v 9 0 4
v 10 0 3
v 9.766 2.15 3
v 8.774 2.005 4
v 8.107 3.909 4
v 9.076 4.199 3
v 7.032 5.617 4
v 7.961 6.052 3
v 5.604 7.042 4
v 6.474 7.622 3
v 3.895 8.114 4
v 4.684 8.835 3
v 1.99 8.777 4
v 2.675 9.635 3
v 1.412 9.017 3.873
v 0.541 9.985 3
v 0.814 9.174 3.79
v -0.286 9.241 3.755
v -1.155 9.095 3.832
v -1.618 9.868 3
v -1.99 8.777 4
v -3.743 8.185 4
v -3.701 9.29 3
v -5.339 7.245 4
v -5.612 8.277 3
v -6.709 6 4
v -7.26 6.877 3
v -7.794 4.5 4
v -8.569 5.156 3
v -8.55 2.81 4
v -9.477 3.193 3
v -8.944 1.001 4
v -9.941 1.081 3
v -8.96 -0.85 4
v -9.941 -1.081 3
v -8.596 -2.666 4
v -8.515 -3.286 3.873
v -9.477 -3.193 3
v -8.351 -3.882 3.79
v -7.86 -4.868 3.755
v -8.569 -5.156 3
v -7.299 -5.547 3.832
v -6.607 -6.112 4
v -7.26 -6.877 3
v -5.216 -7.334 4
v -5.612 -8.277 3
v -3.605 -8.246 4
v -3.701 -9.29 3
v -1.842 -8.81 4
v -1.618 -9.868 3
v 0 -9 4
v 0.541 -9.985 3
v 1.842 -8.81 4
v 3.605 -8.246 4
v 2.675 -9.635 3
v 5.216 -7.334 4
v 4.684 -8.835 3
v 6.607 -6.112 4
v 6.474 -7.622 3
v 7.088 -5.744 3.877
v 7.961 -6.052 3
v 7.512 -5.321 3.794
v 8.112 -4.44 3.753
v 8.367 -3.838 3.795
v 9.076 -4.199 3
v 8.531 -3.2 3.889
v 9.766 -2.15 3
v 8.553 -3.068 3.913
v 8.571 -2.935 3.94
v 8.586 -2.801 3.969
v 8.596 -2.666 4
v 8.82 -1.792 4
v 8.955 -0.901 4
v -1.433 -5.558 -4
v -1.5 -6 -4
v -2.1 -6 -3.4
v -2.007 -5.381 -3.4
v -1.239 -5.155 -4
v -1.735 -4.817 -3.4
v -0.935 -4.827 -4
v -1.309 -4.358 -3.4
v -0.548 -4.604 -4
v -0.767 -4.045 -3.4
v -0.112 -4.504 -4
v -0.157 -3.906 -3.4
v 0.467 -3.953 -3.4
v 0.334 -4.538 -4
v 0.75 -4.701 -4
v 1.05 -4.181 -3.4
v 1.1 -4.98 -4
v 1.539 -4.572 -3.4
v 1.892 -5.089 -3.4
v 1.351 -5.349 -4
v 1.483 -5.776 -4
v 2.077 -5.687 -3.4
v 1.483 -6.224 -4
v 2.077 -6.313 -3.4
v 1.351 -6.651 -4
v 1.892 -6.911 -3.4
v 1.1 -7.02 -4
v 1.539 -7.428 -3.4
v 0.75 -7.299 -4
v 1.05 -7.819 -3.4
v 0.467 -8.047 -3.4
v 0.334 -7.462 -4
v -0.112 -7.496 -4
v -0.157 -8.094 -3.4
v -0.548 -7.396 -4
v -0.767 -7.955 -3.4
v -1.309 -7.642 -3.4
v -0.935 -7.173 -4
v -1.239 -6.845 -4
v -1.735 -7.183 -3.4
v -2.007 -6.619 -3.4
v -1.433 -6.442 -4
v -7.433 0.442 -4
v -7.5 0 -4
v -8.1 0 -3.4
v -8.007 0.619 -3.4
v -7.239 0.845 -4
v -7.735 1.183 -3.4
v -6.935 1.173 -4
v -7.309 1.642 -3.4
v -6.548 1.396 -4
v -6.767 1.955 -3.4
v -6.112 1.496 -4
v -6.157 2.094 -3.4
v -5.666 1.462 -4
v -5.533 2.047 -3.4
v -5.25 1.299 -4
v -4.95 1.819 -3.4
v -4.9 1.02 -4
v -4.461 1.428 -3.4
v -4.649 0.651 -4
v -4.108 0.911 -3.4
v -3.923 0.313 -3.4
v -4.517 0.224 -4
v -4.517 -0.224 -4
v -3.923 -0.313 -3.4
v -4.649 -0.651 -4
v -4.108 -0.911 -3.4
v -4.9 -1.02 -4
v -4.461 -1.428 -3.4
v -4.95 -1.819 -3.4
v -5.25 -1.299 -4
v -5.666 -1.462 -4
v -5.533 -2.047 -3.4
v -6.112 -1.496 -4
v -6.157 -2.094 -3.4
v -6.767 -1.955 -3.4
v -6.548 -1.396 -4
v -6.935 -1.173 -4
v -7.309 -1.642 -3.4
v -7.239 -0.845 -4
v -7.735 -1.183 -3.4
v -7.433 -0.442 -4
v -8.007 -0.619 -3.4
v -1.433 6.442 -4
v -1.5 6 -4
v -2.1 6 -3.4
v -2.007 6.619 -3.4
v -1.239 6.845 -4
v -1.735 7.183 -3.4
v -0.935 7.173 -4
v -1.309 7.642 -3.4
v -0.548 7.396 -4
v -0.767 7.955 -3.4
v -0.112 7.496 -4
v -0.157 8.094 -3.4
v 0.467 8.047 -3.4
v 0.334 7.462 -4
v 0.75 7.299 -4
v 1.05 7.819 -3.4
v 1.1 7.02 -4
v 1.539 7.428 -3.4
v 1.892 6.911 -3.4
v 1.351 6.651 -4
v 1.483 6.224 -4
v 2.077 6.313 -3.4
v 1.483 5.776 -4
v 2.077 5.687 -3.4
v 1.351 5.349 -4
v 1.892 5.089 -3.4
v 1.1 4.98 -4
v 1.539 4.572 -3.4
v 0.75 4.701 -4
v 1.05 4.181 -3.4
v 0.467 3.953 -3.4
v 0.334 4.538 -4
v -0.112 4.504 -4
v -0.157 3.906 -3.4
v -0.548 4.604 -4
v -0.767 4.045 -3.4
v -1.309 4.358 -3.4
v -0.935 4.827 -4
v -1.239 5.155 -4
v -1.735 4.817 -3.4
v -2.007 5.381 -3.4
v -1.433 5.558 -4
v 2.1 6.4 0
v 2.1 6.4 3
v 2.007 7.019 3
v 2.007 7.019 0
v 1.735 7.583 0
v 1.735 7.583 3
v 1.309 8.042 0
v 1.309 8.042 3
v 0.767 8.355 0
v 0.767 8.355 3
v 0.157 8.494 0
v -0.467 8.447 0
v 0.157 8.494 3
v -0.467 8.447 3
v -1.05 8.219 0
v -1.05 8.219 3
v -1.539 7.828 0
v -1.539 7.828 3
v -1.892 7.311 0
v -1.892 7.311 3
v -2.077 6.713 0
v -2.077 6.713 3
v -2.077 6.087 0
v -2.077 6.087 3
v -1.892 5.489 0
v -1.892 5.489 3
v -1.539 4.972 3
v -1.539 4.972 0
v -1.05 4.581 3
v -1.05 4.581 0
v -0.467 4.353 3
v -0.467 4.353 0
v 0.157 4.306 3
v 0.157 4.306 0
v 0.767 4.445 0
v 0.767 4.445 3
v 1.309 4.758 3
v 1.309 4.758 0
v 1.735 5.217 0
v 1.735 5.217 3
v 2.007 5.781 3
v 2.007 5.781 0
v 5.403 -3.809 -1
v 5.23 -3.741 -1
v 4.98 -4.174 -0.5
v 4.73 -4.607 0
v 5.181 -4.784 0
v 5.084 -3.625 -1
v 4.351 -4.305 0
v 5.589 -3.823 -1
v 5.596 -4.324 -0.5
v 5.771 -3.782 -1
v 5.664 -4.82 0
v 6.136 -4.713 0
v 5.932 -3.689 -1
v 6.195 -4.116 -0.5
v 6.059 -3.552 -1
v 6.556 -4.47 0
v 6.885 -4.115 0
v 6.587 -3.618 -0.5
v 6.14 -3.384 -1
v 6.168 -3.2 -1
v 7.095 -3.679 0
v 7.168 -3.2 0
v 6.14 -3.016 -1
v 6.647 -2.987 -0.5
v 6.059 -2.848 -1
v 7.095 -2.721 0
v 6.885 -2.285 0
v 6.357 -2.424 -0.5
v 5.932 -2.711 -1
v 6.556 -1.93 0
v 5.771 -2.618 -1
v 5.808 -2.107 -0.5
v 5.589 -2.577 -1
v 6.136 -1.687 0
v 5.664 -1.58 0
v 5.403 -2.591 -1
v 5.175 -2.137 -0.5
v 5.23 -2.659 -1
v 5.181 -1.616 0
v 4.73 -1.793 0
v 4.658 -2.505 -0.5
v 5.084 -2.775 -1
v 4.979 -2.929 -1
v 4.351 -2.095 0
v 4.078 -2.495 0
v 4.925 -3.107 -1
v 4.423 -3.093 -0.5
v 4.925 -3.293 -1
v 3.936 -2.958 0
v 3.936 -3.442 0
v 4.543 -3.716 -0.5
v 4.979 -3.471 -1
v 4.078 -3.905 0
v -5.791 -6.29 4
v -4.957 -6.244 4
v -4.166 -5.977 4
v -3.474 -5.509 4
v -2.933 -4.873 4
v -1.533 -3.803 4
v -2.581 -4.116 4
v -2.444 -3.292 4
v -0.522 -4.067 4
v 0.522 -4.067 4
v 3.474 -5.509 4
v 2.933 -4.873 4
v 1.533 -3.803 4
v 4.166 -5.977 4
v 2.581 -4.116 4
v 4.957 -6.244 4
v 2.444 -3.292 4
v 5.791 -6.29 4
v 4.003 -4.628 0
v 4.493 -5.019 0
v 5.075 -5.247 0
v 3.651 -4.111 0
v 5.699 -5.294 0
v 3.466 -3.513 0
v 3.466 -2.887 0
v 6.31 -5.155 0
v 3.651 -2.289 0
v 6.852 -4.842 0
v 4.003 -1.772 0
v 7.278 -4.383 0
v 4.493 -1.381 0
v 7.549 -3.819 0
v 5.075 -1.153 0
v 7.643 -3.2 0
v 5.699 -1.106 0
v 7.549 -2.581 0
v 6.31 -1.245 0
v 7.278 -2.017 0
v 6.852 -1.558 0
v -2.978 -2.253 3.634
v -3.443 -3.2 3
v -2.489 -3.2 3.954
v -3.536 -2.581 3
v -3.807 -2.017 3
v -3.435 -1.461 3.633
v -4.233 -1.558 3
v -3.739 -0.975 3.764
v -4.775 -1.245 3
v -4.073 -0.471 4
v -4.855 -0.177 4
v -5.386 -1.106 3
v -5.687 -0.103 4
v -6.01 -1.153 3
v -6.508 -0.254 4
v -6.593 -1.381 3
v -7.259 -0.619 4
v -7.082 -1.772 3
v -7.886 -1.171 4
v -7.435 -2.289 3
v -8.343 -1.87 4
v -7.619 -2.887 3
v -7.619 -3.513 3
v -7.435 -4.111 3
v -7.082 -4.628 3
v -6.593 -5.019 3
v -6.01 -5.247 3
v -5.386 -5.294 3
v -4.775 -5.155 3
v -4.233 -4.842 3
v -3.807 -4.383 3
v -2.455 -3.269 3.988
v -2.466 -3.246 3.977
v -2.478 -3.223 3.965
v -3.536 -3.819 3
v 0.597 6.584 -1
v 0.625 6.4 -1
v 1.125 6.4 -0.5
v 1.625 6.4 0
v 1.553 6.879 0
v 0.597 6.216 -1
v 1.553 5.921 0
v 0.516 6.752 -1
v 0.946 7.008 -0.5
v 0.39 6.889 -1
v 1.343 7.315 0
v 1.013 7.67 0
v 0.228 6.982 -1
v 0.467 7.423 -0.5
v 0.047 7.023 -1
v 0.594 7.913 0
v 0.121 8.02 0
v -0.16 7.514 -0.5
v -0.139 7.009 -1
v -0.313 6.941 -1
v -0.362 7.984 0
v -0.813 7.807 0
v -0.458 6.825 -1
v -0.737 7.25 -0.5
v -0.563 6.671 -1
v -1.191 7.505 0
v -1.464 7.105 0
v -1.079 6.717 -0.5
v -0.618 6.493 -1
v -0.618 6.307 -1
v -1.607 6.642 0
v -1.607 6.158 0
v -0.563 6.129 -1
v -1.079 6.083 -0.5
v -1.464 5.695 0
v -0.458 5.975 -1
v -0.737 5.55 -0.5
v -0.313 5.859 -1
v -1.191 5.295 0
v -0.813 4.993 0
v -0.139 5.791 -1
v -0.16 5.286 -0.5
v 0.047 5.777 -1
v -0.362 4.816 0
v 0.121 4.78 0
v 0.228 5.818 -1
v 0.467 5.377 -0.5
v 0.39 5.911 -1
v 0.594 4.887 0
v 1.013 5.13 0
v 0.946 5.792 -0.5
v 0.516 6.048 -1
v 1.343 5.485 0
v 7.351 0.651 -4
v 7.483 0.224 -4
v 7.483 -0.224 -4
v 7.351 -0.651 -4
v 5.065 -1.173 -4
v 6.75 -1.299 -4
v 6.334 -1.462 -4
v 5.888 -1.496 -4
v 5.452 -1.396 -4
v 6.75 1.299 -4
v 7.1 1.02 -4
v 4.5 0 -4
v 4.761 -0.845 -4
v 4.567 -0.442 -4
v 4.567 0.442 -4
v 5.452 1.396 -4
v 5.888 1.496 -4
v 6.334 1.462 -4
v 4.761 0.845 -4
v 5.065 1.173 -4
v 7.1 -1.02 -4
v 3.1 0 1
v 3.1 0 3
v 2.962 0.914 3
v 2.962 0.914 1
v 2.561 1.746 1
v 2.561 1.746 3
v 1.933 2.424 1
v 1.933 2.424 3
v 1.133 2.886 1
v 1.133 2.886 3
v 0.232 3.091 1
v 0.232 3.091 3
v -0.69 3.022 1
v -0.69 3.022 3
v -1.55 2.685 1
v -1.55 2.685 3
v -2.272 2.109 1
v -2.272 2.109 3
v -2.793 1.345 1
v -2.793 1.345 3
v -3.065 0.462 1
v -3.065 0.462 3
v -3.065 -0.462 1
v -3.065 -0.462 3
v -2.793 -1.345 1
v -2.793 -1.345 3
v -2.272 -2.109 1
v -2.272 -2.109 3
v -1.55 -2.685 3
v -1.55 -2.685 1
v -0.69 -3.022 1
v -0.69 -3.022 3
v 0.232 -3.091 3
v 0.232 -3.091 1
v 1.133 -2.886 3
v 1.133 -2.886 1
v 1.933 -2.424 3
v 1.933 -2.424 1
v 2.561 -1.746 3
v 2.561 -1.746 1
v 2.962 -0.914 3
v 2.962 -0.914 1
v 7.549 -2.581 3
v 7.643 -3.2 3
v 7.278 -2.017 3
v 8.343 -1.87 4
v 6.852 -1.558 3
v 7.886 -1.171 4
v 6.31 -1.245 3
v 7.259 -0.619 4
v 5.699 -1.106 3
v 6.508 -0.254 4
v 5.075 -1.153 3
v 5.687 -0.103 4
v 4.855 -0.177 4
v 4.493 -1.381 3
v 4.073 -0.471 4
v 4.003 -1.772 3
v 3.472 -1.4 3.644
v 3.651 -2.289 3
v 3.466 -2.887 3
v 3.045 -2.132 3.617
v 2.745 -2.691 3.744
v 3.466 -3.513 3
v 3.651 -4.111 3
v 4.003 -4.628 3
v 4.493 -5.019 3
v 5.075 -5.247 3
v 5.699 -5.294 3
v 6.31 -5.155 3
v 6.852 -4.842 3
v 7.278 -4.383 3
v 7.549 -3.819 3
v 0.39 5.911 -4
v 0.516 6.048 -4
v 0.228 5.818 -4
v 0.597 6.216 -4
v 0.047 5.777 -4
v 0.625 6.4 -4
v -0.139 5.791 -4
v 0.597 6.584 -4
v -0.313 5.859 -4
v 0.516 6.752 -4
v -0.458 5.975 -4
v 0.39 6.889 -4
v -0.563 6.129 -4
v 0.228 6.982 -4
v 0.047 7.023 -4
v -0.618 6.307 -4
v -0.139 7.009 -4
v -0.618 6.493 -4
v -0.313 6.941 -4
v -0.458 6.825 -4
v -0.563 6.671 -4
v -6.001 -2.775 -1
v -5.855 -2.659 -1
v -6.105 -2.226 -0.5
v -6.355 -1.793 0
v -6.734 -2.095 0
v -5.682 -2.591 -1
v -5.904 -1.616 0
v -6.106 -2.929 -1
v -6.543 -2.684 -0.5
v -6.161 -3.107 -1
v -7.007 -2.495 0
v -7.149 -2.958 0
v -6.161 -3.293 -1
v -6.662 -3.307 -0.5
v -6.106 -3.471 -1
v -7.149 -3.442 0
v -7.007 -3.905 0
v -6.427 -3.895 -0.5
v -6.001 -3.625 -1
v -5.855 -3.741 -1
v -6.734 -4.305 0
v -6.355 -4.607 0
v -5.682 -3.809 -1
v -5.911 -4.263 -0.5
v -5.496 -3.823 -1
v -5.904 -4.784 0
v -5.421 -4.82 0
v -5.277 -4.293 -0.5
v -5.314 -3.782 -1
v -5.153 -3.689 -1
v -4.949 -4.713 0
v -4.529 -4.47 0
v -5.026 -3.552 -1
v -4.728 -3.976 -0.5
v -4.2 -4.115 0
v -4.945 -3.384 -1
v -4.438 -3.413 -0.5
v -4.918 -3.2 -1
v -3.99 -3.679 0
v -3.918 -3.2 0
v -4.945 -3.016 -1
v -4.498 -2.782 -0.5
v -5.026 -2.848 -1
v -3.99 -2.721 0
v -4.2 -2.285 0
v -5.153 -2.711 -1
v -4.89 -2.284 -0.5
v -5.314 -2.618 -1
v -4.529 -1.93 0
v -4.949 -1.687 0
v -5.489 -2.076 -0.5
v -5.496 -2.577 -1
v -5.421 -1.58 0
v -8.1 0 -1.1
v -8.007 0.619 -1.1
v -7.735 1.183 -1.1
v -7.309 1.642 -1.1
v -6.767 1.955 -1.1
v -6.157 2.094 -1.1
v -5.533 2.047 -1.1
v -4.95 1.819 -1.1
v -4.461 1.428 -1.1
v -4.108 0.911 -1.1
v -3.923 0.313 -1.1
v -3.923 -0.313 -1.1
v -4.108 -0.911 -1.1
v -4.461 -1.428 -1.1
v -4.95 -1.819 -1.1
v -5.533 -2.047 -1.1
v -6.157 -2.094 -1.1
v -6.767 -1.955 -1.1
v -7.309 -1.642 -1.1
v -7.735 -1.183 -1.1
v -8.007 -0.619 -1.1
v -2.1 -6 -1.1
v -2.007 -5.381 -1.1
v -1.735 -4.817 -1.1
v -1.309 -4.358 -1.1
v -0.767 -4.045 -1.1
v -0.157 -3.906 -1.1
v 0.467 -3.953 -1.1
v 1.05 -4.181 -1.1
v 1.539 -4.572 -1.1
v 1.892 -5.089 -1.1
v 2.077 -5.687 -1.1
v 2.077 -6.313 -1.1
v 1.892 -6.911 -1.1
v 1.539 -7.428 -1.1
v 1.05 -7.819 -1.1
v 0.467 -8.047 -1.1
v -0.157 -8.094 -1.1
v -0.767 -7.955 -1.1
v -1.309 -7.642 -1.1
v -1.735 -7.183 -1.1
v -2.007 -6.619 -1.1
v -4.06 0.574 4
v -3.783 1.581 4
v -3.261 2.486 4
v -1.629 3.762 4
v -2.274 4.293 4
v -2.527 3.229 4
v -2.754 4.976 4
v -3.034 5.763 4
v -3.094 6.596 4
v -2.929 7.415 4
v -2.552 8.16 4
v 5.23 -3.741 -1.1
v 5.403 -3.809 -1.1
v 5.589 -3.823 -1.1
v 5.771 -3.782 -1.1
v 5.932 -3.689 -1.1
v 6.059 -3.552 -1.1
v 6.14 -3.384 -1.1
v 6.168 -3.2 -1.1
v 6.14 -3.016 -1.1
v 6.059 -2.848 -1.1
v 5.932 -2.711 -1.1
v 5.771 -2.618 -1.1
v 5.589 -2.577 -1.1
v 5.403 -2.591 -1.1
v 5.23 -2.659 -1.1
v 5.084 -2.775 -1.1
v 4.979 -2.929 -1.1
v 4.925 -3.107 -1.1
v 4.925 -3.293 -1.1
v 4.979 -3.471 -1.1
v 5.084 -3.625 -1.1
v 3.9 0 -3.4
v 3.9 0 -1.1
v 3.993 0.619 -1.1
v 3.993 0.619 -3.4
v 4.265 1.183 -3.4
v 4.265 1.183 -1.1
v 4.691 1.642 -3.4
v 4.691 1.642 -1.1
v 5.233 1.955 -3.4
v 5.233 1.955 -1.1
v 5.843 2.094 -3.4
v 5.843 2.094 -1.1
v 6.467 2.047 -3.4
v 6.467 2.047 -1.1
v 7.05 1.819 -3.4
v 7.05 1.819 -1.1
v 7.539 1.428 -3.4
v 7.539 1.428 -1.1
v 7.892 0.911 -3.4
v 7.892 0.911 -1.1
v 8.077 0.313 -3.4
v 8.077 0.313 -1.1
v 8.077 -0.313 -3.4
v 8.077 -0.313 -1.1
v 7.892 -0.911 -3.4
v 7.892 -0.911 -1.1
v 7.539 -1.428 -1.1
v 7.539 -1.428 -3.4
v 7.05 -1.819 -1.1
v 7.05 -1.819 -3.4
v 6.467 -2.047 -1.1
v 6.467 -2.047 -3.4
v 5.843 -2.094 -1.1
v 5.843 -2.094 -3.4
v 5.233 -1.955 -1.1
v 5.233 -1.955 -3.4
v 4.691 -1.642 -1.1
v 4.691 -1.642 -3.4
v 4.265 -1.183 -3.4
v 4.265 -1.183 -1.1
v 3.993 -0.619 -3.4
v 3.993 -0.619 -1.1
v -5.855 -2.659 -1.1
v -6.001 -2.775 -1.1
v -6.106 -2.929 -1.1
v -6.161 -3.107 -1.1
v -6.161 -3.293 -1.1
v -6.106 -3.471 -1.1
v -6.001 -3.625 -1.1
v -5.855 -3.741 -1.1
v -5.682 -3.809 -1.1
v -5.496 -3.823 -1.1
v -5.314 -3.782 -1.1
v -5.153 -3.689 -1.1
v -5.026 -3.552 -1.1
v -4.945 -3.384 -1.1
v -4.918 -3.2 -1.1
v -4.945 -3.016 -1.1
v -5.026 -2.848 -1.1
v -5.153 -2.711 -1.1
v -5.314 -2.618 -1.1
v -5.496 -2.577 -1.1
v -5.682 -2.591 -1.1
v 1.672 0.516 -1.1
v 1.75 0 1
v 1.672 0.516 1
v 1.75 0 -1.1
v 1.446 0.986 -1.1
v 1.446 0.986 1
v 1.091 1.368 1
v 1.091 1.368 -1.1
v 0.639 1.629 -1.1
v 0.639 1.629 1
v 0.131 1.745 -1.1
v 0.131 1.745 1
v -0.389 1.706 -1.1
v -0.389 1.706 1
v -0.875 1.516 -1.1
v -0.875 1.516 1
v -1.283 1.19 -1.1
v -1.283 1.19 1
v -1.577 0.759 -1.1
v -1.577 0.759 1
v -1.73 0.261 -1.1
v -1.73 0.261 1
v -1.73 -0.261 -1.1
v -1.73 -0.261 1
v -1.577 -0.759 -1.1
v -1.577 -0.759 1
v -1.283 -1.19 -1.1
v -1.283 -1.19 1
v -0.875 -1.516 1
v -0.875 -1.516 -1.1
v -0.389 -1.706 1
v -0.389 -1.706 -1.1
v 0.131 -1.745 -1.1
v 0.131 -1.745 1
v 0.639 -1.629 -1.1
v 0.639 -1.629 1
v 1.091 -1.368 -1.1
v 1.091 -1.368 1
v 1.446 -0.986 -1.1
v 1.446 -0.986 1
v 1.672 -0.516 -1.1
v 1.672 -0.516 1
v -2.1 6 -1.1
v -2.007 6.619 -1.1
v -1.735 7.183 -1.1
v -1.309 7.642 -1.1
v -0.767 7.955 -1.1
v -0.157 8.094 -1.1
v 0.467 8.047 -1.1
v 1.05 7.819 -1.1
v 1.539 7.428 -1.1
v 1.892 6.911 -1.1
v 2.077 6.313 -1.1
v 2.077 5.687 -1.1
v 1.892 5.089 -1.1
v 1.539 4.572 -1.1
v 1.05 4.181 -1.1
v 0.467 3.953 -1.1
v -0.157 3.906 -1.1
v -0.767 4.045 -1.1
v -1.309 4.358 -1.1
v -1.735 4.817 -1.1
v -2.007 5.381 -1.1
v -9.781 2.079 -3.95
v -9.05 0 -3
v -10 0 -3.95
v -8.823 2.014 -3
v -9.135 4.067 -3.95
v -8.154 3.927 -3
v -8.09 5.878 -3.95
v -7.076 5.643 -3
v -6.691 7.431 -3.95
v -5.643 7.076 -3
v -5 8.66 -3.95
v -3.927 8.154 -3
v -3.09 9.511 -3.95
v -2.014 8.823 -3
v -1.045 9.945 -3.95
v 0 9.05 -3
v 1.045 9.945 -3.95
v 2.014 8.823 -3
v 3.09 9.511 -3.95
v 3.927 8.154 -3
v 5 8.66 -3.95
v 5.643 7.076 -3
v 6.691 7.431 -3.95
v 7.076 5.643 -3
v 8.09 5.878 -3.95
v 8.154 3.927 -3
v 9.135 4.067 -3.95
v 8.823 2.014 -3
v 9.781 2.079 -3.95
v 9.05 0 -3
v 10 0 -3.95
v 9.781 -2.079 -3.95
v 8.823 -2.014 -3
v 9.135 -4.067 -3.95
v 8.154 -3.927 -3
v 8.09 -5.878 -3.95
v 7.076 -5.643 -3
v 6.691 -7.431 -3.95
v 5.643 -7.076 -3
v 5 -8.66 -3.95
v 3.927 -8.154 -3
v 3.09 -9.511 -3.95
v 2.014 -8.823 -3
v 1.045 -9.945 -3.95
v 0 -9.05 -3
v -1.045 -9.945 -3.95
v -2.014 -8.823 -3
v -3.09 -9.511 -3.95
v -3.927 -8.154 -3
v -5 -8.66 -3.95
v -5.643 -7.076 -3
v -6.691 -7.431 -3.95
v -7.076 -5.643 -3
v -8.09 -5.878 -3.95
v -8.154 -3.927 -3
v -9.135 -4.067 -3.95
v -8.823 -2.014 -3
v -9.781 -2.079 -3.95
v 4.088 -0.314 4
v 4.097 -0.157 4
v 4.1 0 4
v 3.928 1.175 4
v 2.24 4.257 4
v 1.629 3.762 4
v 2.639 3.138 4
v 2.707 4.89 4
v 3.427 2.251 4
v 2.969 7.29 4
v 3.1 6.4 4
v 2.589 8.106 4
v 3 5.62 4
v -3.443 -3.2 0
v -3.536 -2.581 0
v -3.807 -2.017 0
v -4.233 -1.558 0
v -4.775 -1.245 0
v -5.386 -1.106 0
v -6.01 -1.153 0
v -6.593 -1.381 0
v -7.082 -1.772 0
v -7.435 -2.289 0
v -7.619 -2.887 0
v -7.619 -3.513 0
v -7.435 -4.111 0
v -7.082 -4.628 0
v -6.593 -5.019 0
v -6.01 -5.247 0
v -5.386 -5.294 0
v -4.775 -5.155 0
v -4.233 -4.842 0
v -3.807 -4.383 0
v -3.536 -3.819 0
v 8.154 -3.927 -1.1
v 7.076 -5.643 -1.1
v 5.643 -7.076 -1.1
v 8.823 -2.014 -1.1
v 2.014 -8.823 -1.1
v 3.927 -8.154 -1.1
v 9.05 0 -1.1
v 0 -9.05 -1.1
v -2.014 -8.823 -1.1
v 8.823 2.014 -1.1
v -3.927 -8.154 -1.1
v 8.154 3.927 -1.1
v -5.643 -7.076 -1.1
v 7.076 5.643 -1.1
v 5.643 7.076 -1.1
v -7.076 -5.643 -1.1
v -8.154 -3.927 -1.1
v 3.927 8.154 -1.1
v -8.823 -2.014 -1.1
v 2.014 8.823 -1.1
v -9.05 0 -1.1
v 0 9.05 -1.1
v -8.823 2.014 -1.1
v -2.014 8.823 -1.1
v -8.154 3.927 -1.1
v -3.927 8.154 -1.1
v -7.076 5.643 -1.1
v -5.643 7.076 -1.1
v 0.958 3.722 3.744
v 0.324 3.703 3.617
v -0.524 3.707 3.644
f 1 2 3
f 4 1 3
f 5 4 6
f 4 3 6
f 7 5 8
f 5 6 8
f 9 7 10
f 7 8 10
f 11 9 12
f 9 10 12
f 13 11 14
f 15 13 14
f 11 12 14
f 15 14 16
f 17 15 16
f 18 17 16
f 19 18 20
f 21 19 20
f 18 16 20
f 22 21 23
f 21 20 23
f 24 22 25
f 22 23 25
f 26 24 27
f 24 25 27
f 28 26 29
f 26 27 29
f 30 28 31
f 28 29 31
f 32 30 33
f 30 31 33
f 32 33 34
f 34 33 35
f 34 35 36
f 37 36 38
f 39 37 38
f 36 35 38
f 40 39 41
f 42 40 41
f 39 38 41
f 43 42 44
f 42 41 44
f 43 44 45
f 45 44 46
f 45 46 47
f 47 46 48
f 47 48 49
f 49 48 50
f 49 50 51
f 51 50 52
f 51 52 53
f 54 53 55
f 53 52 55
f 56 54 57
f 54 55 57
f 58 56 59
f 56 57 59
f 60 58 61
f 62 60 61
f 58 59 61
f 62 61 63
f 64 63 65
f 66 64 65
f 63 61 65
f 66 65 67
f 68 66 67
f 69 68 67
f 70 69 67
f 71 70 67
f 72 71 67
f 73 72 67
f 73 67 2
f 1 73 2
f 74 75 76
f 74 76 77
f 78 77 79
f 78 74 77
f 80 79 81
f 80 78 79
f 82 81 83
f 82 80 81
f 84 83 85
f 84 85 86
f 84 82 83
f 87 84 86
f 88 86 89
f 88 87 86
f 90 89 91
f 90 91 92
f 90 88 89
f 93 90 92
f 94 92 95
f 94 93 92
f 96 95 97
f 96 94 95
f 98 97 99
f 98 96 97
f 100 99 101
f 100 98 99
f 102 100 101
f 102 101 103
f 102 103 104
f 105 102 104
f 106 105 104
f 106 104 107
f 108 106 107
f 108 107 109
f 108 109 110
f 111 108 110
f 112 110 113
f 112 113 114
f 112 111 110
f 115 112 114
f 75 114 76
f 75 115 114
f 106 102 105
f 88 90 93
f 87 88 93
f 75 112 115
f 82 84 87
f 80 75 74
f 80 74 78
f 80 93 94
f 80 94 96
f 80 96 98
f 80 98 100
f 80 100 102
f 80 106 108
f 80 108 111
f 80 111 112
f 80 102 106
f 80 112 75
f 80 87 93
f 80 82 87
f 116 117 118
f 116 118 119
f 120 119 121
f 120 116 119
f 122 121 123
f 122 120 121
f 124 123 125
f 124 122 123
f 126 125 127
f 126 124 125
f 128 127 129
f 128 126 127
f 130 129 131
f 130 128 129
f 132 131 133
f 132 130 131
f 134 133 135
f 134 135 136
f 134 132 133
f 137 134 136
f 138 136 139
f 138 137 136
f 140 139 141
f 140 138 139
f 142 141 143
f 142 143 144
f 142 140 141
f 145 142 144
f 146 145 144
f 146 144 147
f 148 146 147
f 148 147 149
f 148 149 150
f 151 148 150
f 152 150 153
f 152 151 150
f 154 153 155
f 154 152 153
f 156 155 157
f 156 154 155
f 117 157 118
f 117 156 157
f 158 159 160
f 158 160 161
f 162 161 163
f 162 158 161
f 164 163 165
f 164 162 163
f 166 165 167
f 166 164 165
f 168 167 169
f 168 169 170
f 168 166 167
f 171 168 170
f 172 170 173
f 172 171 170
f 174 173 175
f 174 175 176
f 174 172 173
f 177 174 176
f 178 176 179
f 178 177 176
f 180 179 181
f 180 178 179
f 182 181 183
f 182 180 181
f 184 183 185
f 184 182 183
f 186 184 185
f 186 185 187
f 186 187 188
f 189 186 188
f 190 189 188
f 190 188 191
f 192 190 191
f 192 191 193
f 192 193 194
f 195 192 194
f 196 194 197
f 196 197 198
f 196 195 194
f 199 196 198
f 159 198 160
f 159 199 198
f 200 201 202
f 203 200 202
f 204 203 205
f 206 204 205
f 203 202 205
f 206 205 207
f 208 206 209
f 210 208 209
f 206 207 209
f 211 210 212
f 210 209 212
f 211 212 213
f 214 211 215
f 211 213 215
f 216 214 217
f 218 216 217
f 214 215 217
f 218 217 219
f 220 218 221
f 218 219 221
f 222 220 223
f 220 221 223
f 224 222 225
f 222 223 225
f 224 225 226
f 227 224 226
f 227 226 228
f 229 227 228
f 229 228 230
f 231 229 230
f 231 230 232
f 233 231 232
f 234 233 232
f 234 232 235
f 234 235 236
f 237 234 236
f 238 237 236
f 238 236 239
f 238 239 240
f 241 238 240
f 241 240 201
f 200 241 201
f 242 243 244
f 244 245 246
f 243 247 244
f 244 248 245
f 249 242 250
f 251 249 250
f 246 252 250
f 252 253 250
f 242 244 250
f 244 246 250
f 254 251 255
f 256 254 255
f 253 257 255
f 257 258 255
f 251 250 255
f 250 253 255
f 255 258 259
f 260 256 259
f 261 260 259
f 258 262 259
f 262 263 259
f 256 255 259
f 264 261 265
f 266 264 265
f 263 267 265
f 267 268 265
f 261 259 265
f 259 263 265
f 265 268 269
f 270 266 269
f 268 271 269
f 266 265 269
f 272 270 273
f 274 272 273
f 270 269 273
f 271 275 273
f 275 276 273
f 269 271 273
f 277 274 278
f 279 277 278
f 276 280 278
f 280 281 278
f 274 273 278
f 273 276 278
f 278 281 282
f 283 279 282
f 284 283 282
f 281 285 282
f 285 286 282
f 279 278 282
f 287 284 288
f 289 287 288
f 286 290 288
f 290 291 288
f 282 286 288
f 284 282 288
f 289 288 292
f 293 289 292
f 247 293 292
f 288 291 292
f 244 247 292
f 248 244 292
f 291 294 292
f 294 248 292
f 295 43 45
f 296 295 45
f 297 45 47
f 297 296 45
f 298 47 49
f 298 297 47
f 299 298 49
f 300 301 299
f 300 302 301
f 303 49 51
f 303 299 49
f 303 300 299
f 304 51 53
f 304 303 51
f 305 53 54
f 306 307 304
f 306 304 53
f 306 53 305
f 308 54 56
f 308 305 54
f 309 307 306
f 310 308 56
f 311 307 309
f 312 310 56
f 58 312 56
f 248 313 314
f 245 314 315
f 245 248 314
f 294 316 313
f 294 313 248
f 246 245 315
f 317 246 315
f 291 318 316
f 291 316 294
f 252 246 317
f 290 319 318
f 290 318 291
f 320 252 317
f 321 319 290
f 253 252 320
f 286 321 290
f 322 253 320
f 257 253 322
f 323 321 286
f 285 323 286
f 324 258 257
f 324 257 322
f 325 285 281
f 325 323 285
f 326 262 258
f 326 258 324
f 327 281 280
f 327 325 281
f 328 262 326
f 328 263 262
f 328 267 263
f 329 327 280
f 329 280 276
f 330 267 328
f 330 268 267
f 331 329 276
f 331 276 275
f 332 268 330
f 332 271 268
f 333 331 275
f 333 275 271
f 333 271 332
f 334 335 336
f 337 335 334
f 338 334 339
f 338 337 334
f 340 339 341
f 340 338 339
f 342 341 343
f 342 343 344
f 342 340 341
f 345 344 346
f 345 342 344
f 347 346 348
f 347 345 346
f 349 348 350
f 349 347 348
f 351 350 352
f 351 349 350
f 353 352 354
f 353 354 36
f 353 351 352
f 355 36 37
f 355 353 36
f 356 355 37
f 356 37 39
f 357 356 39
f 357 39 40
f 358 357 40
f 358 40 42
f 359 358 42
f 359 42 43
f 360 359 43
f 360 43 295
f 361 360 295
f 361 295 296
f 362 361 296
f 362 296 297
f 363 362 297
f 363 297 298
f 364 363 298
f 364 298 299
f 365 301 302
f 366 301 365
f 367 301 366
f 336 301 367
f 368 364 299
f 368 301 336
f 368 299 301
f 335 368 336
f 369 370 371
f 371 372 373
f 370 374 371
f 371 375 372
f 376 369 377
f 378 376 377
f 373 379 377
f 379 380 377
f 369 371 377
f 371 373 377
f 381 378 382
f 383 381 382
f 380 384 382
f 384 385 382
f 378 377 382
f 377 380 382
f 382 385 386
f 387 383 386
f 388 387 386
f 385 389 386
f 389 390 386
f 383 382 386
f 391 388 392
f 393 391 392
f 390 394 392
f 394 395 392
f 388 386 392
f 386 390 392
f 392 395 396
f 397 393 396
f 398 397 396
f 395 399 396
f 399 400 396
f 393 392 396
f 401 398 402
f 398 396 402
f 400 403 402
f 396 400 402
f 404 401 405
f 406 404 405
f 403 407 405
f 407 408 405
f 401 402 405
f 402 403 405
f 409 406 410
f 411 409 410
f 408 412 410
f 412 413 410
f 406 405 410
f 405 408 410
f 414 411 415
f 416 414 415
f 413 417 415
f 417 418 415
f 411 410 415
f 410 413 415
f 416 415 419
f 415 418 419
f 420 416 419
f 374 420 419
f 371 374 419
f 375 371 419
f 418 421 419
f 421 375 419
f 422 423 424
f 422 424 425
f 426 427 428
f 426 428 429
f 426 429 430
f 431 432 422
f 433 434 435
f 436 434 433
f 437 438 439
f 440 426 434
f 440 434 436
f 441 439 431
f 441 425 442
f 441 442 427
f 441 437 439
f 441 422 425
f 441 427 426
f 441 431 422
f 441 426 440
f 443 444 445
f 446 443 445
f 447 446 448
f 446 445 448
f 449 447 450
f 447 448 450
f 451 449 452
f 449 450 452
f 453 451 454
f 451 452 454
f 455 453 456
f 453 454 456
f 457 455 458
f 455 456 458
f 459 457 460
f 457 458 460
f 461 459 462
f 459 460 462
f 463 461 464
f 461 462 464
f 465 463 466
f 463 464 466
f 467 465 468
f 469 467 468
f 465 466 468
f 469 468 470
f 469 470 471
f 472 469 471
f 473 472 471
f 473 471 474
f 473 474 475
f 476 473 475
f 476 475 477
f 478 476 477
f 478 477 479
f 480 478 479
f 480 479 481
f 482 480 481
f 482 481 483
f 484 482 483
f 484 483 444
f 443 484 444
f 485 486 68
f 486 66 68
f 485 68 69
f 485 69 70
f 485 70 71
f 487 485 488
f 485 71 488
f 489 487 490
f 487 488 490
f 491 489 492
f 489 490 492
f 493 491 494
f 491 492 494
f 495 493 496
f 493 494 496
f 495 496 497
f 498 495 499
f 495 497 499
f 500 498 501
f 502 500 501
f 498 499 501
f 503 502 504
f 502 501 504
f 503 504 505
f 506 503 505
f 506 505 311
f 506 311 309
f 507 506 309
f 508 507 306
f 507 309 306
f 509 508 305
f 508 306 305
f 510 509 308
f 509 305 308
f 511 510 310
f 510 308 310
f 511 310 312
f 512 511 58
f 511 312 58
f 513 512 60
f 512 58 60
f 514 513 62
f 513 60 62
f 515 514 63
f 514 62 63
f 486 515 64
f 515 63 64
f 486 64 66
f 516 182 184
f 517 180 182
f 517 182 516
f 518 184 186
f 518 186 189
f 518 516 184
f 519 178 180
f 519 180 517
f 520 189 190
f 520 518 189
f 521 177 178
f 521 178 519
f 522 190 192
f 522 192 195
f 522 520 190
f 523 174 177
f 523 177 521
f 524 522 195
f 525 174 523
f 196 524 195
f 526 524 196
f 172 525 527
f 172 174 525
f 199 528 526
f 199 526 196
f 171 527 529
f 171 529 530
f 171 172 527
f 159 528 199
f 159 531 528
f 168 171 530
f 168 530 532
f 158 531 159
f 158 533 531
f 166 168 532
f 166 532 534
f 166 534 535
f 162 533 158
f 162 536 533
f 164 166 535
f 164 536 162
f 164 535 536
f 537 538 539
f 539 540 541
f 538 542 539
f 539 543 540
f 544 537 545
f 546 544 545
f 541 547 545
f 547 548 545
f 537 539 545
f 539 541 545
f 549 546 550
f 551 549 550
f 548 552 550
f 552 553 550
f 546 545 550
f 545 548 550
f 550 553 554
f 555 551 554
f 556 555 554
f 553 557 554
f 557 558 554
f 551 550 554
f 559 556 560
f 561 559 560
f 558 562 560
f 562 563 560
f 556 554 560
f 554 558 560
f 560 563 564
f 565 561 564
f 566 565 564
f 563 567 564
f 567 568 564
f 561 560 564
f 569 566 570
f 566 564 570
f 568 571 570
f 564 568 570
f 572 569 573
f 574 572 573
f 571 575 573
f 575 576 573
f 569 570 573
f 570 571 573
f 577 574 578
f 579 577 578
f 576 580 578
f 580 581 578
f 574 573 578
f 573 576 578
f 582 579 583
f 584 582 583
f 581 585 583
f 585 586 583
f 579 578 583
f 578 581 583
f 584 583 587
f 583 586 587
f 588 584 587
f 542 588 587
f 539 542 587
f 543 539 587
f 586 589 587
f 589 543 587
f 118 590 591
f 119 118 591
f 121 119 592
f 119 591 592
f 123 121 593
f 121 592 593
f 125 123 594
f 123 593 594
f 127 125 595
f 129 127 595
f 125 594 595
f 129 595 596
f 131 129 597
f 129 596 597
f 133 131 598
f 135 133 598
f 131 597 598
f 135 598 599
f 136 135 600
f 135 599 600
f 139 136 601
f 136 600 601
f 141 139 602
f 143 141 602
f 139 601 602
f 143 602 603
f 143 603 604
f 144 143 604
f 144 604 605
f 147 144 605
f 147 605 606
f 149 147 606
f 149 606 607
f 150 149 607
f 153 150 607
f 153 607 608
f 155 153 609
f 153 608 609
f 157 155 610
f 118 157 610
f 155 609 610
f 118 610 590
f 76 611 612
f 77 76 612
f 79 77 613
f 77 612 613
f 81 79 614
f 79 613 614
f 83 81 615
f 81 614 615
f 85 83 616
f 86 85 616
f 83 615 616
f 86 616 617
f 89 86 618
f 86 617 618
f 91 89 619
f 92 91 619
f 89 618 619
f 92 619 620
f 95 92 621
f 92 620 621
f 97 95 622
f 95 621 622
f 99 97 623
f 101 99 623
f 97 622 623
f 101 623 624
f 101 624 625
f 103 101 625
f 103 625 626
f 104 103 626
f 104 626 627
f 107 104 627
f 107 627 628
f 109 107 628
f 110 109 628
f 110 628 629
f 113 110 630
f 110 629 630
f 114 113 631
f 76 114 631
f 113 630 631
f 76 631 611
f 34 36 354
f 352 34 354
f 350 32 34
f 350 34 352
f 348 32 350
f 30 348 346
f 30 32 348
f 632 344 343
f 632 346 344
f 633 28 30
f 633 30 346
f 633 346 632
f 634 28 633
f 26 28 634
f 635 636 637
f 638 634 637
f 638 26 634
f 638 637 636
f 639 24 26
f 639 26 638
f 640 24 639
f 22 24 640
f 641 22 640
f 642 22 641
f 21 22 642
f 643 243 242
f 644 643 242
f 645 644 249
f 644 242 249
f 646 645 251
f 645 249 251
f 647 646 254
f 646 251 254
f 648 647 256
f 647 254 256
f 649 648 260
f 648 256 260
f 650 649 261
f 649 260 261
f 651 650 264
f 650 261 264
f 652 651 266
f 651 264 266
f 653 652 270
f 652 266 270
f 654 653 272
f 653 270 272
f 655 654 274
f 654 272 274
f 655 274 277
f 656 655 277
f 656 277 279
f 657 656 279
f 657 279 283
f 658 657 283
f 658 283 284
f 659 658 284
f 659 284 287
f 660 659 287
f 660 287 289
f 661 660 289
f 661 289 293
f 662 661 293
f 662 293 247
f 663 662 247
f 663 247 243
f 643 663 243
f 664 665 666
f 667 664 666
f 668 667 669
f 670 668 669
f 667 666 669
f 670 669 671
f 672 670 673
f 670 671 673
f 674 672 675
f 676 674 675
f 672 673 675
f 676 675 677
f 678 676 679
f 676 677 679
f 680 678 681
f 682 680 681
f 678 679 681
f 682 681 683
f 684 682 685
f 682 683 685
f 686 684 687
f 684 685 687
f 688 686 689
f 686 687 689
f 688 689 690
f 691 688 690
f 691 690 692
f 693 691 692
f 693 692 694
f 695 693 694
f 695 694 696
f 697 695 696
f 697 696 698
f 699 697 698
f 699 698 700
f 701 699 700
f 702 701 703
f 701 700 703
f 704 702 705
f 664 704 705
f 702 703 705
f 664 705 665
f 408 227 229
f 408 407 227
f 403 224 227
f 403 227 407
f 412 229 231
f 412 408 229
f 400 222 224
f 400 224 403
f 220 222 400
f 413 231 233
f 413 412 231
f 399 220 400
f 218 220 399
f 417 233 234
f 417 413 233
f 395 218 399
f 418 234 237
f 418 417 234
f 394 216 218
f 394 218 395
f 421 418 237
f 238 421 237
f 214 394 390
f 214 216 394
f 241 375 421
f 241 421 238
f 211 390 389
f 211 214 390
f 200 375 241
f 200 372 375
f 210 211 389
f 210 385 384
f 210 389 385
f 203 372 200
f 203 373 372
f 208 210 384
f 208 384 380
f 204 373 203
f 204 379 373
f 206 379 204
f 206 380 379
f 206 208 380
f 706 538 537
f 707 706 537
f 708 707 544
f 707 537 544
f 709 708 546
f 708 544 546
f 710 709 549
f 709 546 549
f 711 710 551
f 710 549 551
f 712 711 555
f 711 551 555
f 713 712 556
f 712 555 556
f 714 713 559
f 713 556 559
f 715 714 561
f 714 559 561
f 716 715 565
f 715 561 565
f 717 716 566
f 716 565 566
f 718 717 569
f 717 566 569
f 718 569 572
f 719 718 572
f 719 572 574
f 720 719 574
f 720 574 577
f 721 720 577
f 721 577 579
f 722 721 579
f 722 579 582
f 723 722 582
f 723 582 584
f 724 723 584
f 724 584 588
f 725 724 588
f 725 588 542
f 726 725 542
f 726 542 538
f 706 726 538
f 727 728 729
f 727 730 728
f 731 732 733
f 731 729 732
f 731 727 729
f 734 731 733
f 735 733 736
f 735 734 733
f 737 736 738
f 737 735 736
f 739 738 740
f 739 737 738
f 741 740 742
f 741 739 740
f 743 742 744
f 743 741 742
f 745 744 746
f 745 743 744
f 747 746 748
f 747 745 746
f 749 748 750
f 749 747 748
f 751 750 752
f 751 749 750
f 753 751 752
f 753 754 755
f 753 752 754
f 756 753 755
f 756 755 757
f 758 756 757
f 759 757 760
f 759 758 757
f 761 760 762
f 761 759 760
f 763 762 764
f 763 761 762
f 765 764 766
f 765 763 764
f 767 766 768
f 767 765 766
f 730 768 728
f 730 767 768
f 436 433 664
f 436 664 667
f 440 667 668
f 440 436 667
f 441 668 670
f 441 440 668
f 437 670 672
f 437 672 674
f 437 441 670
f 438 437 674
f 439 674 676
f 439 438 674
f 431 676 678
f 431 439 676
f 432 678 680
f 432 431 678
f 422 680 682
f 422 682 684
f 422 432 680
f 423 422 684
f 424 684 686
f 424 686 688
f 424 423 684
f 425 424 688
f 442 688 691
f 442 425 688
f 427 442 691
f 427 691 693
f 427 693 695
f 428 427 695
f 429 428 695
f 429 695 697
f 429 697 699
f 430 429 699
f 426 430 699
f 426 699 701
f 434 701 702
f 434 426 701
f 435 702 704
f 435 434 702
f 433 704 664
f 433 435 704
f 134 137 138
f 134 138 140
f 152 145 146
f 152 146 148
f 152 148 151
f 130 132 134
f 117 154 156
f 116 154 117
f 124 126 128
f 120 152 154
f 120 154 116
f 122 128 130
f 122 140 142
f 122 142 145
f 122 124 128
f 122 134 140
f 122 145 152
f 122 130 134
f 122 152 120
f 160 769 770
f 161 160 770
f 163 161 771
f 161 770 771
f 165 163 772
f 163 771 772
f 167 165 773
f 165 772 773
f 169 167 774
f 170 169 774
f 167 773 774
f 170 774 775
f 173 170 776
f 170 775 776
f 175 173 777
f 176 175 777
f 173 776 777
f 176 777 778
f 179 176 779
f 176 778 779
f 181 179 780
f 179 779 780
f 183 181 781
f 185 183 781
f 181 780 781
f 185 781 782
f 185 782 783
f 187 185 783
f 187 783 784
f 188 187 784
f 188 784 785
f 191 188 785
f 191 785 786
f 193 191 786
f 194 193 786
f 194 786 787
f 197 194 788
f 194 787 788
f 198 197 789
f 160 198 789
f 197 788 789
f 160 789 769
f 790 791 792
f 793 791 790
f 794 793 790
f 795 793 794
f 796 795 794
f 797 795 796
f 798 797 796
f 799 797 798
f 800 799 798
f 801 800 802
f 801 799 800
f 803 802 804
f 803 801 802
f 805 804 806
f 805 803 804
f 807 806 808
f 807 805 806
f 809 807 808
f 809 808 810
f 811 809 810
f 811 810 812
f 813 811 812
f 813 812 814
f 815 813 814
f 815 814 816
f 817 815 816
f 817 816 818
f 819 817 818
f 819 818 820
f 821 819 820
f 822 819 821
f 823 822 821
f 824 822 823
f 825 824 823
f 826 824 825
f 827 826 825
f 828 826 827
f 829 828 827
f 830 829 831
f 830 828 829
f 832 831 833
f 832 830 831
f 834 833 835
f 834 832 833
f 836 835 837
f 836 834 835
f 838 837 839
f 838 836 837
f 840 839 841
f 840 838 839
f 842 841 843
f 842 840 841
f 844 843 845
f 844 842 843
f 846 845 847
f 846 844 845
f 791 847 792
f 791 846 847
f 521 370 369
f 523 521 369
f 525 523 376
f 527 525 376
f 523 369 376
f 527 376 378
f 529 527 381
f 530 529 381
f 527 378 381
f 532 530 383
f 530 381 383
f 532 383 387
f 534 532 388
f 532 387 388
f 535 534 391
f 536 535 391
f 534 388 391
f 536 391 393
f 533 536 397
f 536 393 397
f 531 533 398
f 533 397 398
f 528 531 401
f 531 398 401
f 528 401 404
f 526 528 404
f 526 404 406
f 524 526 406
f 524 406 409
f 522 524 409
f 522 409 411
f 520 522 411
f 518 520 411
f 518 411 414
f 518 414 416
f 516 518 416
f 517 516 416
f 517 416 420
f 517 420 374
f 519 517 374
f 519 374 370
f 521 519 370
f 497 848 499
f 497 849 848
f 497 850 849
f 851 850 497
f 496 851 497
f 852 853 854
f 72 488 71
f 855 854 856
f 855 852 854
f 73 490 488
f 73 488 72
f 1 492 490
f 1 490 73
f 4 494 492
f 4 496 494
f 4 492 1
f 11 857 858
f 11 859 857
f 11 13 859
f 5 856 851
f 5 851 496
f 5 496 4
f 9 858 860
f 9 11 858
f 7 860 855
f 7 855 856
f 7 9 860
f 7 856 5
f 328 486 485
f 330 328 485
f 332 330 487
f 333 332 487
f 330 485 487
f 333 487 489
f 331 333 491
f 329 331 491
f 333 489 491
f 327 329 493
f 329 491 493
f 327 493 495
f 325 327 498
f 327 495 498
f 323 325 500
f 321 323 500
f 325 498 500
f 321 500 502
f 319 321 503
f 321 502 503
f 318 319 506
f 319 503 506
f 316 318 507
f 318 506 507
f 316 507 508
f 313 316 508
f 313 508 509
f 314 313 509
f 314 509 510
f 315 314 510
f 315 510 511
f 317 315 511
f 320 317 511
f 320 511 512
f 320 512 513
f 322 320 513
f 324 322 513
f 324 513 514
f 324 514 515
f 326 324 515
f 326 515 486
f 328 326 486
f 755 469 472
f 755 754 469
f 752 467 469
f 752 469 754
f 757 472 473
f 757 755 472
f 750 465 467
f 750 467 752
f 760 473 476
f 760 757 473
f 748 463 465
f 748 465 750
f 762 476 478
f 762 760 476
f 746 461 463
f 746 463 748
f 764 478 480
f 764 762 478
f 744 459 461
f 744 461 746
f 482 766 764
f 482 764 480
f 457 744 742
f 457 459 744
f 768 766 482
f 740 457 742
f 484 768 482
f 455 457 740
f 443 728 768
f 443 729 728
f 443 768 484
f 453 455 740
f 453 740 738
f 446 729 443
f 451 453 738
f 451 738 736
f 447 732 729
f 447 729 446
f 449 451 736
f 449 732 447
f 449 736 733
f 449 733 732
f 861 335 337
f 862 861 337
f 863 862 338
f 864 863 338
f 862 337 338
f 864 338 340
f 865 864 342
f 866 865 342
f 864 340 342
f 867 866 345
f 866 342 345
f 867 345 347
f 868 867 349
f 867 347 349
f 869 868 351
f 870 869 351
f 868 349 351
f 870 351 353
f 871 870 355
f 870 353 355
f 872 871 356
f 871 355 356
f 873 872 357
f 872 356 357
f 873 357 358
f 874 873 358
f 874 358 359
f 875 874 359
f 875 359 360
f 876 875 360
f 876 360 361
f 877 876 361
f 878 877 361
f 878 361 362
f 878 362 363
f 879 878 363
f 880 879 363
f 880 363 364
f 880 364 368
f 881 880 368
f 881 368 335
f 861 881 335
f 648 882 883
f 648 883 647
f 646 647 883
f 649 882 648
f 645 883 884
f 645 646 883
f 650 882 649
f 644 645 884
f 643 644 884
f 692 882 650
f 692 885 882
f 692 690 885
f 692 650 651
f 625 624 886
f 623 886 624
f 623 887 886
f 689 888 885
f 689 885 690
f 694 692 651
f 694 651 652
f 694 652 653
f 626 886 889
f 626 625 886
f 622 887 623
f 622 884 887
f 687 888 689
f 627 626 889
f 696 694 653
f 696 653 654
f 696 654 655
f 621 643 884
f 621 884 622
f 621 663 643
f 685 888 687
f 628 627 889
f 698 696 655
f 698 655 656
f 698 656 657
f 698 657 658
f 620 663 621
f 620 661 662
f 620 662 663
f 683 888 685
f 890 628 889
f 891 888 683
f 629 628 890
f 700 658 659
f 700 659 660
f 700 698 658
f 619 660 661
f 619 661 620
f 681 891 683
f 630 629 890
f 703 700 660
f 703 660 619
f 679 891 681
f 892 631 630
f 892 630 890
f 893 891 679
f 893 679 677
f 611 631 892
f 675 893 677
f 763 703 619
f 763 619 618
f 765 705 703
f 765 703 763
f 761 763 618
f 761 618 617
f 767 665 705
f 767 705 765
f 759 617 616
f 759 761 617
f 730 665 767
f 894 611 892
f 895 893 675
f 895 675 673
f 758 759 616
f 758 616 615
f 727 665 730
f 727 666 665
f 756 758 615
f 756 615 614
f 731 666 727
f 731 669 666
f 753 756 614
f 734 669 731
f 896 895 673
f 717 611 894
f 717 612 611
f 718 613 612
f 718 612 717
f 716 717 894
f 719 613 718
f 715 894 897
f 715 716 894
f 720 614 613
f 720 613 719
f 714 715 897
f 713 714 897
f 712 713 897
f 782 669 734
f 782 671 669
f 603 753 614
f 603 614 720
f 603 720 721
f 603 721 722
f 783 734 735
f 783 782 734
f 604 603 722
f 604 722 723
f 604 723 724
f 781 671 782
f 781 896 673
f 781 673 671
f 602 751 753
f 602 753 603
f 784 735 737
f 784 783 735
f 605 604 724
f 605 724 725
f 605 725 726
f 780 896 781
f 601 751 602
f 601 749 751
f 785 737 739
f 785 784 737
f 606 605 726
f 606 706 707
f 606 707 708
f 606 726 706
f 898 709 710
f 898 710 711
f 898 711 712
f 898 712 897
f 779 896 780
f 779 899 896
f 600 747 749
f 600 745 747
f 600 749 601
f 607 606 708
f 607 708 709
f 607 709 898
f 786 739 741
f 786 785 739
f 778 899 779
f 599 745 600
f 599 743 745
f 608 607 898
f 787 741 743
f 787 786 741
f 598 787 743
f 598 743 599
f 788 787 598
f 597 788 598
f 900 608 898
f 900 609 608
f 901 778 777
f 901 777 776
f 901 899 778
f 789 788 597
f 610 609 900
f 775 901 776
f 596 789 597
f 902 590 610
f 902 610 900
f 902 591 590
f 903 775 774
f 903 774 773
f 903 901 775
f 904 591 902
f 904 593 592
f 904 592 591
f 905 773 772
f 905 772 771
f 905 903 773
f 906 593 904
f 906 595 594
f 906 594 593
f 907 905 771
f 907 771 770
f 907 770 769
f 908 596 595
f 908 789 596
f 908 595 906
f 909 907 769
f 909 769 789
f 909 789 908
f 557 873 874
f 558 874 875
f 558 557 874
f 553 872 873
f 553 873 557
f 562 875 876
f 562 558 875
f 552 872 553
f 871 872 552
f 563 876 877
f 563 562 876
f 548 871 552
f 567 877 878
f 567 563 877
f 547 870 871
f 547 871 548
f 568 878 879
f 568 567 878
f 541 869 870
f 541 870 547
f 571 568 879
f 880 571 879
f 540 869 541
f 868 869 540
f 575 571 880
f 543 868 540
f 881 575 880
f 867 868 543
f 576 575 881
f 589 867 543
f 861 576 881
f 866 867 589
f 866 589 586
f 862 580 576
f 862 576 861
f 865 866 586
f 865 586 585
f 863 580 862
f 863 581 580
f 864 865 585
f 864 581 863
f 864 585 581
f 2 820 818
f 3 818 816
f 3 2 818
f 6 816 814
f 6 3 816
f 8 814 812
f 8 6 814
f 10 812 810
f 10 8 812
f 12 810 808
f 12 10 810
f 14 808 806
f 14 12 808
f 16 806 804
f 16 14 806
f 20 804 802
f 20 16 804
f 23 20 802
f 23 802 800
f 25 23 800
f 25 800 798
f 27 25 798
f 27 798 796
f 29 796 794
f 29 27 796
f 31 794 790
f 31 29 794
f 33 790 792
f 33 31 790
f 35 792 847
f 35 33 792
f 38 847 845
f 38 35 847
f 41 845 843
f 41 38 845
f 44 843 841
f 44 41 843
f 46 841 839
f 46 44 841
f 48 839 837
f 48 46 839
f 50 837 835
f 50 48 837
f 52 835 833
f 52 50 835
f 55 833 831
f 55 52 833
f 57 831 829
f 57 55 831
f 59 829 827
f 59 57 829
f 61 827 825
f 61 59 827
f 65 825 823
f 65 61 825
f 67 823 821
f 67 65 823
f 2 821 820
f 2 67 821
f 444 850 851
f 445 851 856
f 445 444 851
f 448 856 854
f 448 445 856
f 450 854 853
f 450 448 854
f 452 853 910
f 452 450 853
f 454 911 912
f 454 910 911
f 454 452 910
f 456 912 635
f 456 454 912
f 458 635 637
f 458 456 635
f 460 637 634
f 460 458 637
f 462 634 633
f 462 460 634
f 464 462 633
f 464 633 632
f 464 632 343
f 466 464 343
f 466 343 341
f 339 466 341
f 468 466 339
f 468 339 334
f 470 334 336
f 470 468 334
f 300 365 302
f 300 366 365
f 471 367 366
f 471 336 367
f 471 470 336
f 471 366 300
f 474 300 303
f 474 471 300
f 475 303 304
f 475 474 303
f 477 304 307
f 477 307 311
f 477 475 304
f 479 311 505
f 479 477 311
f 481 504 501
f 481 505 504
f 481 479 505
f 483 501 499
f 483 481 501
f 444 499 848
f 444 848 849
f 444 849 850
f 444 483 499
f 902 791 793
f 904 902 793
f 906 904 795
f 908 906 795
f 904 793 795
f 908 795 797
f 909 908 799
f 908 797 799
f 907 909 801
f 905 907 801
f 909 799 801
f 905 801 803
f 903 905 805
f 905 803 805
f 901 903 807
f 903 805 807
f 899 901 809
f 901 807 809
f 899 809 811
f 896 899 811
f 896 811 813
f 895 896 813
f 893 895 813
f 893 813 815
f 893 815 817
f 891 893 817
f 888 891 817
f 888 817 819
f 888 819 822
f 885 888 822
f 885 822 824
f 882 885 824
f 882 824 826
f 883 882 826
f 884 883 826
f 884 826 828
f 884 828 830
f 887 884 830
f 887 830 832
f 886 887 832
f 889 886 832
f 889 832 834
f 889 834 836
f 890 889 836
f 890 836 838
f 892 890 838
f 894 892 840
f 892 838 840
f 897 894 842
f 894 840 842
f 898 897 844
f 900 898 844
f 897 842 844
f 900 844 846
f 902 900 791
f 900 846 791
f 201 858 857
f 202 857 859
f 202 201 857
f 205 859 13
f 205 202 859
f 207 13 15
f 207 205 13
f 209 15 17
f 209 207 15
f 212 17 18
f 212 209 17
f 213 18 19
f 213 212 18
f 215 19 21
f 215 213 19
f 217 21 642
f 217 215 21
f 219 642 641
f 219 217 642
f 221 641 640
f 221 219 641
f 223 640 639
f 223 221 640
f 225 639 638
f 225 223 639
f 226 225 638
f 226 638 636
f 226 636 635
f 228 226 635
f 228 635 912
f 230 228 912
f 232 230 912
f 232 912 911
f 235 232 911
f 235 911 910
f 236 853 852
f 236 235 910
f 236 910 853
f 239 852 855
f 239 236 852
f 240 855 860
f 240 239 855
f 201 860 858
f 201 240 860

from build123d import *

# Parameters (mm, degrees)
SKETCH1_R                = 10
SKETCH1_R_2              = 2.1
SKETCH1_R_3              = 1.75
BOSS_EXTRUDE1_DEPTH      = 4
SKETCH2_R                = 9.05
CUT_EXTRUDE1_DEPTH       = 2.9
CHAMFER1_SIZE            = 1
BOSS_EXTRUDE2_DEPTH      = 2.9
BOSS_EXTRUDE2_DEPTH_BACK = 5.1
SKETCH3_R                = 2.1
CHAMFER2_SIZE            = 0.6
SKETCH4_R                = 3.1
CUT_EXTRUDE2_DEPTH       = 3
SKETCH5_R                = 2.1
CUT_EXTRUDE3_DEPTH       = 4
SKETCH6_R                = 0.625
CUT_EXTRUDE4_DEPTH       = 15.696938457
CIRPATTERN1_COUNT        = 3
CHAMFER3_SIZE            = 1
CHAMFER4_SIZE            = 1


with BuildPart() as part:
    # Sketch1 → Boss-Extrude1 (new, symmetric)
    with BuildSketch(Plane.XY):
        Circle(SKETCH1_R)
        with Locations((6, 0)):
            Circle(SKETCH1_R_2, mode=Mode.SUBTRACT)
        Circle(SKETCH1_R_3, mode=Mode.SUBTRACT)
        with Locations((0, -6)):
            Circle(SKETCH1_R_2, mode=Mode.SUBTRACT)
        with Locations((-6, 0)):
            Circle(SKETCH1_R_2, mode=Mode.SUBTRACT)
        with Locations((0, 6)):
            Circle(SKETCH1_R_2, mode=Mode.SUBTRACT)
    extrude(amount=BOSS_EXTRUDE1_DEPTH, both=True)

    # Sketch2 → Cut-Extrude1 (cut)
    with BuildSketch(Plane(origin=(0, 0, -4), x_dir=(-1, 0, 0), z_dir=(0, 0, -1))):
        Circle(SKETCH2_R)
    extrude(amount=-CUT_EXTRUDE1_DEPTH, mode=Mode.SUBTRACT)

    # Chamfer1
    # the kernel refuses this chamfer: 1 mm, written as the material it takes off along each edge
    with BuildSketch(Plane(origin=(0, 0, -4), x_dir=(-1, 0, 0), z_dir=(0, -1, 0))) as chamfer1_piece_1:
        Polygon((9.05 + CHAMFER1_SIZE, 0), (9.05, -CHAMFER1_SIZE), (9.05, 0), align=None)
    revolve(axis=Axis((0, 0, -4), (0, 0, -1)), mode=Mode.SUBTRACT)

    # Sketch3 → Boss-Extrude2 (add, two sides: drawn at the far end of the back side and taken through both)
    with BuildSketch(Plane(origin=(0, 0, -1.1), x_dir=(-1, 0, 0), z_dir=(0, 0, -1)).offset(-BOSS_EXTRUDE2_DEPTH_BACK)):
        with Locations((-6, 0)):
            Circle(SKETCH3_R)
        with Locations((0, -6)):
            Circle(SKETCH3_R)
        with Locations((6, 0)):
            Circle(SKETCH3_R)
        with Locations((0, 6)):
            Circle(SKETCH3_R)
    extrude(amount=BOSS_EXTRUDE2_DEPTH + BOSS_EXTRUDE2_DEPTH_BACK)

    # Chamfer2
    chamfer2_edges = [part.edges().sort_by_distance(p)[0] for p in [
        (8.1, 0, -4),
        (2.1, -6, -4),
        (-3.9, 0, -4),
        (2.1, 6, -4),
    ]]
    chamfer(chamfer2_edges, length=CHAMFER2_SIZE)

    # Sketch4 → Cut-Extrude2 (cut)
    with BuildSketch(Plane.XY.offset(4)):
        Circle(SKETCH4_R)
    extrude(amount=-CUT_EXTRUDE2_DEPTH, mode=Mode.SUBTRACT)

    # Sketch5 → Cut-Extrude3 (cut)
    with BuildSketch(Plane.XY.offset(4)):
        with Locations((0, 6.4)):
            Circle(SKETCH5_R)
        with Locations((5.542562584, -3.2)):
            Circle(SKETCH5_R)
        with Locations((-5.542562584, -3.2)):
            Circle(SKETCH5_R)
    extrude(amount=-CUT_EXTRUDE3_DEPTH, mode=Mode.SUBTRACT)

    # Sketch6 → Cut-Extrude4 (cut, through all)
    with BuildSketch(Plane.XY):
        with Locations((0, 6.4)):
            Circle(SKETCH6_R)
    cut_extrude4 = extrude(amount=-CUT_EXTRUDE4_DEPTH, mode=Mode.SUBTRACT)

    # CirPattern1: Cut-Extrude4 ×3 about axis
    cirpattern1_axis = Axis((0, 0, 0), (0, 0, 1))
    for i in range(1, CIRPATTERN1_COUNT):
        add(cut_extrude4.rotate(cirpattern1_axis, i * 360 / CIRPATTERN1_COUNT), mode=Mode.SUBTRACT)

    # Chamfer3
    chamfer3_edges = [part.edges().sort_by_distance(p)[0] for p in [
        (-0.625, 6.4, 0),
        (5.855062584, -2.658734123, 0),
        (-5.230062584, -3.741265877, 0),
    ]]
    chamfer(chamfer3_edges, length=CHAMFER3_SIZE)

    # Chamfer4
    # the kernel refuses this chamfer: 1 mm, written as the material it takes off along each edge
    with BuildSketch(Plane(origin=(0, 6.4, 4), x_dir=(1, 0, 0), z_dir=(0, -1, 0))) as chamfer4_piece_1:
        Polygon((2.1 + CHAMFER4_SIZE, 0), (2.1, -CHAMFER4_SIZE), (2.1, 0), align=None)
    revolve(axis=Axis((0, 6.4, 4), (0, 0, 1)), mode=Mode.SUBTRACT)
    with BuildSketch(Plane(origin=(5.542562584, -3.2, 4), x_dir=(1, 0, 0), z_dir=(0, -1, 0))) as chamfer4_piece_2:
        Polygon((2.1, -CHAMFER4_SIZE), (2.1 + CHAMFER4_SIZE, 0), (2.1, 0), align=None)
    revolve(axis=Axis((5.542562584, -3.2, 4), (0, 0, 1)), mode=Mode.SUBTRACT)
    with BuildSketch(Plane(origin=(-5.542562584, -3.2, 4), x_dir=(1, 0, 0), z_dir=(0, -1, 0))) as chamfer4_piece_3:
        Polygon((2.1 + CHAMFER4_SIZE, 0), (2.1, -CHAMFER4_SIZE), (2.1, 0), align=None)
    revolve(axis=Axis((-5.542562584, -3.2, 4), (0, 0, 1)), mode=Mode.SUBTRACT)
    with BuildSketch(Plane(origin=(0, 0, 4), x_dir=(1, 0, 0), z_dir=(0, -1, 0))) as chamfer4_piece_4:
        Polygon((10 - CHAMFER4_SIZE, 0), (10, -CHAMFER4_SIZE), (10, 0), align=None)
    revolve(axis=Axis((0, 0, 4), (0, 0, 1)), mode=Mode.SUBTRACT)
    with BuildSketch(Plane(origin=(0, 0, 4), x_dir=(1, 0, 0), z_dir=(0, -1, 0))) as chamfer4_piece_5:
        Polygon((3.1 + CHAMFER4_SIZE, 0), (3.1, -CHAMFER4_SIZE), (3.1, 0), align=None)
    revolve(axis=Axis((0, 0, 4), (0, 0, 1)), mode=Mode.SUBTRACT)


solid = part.part
